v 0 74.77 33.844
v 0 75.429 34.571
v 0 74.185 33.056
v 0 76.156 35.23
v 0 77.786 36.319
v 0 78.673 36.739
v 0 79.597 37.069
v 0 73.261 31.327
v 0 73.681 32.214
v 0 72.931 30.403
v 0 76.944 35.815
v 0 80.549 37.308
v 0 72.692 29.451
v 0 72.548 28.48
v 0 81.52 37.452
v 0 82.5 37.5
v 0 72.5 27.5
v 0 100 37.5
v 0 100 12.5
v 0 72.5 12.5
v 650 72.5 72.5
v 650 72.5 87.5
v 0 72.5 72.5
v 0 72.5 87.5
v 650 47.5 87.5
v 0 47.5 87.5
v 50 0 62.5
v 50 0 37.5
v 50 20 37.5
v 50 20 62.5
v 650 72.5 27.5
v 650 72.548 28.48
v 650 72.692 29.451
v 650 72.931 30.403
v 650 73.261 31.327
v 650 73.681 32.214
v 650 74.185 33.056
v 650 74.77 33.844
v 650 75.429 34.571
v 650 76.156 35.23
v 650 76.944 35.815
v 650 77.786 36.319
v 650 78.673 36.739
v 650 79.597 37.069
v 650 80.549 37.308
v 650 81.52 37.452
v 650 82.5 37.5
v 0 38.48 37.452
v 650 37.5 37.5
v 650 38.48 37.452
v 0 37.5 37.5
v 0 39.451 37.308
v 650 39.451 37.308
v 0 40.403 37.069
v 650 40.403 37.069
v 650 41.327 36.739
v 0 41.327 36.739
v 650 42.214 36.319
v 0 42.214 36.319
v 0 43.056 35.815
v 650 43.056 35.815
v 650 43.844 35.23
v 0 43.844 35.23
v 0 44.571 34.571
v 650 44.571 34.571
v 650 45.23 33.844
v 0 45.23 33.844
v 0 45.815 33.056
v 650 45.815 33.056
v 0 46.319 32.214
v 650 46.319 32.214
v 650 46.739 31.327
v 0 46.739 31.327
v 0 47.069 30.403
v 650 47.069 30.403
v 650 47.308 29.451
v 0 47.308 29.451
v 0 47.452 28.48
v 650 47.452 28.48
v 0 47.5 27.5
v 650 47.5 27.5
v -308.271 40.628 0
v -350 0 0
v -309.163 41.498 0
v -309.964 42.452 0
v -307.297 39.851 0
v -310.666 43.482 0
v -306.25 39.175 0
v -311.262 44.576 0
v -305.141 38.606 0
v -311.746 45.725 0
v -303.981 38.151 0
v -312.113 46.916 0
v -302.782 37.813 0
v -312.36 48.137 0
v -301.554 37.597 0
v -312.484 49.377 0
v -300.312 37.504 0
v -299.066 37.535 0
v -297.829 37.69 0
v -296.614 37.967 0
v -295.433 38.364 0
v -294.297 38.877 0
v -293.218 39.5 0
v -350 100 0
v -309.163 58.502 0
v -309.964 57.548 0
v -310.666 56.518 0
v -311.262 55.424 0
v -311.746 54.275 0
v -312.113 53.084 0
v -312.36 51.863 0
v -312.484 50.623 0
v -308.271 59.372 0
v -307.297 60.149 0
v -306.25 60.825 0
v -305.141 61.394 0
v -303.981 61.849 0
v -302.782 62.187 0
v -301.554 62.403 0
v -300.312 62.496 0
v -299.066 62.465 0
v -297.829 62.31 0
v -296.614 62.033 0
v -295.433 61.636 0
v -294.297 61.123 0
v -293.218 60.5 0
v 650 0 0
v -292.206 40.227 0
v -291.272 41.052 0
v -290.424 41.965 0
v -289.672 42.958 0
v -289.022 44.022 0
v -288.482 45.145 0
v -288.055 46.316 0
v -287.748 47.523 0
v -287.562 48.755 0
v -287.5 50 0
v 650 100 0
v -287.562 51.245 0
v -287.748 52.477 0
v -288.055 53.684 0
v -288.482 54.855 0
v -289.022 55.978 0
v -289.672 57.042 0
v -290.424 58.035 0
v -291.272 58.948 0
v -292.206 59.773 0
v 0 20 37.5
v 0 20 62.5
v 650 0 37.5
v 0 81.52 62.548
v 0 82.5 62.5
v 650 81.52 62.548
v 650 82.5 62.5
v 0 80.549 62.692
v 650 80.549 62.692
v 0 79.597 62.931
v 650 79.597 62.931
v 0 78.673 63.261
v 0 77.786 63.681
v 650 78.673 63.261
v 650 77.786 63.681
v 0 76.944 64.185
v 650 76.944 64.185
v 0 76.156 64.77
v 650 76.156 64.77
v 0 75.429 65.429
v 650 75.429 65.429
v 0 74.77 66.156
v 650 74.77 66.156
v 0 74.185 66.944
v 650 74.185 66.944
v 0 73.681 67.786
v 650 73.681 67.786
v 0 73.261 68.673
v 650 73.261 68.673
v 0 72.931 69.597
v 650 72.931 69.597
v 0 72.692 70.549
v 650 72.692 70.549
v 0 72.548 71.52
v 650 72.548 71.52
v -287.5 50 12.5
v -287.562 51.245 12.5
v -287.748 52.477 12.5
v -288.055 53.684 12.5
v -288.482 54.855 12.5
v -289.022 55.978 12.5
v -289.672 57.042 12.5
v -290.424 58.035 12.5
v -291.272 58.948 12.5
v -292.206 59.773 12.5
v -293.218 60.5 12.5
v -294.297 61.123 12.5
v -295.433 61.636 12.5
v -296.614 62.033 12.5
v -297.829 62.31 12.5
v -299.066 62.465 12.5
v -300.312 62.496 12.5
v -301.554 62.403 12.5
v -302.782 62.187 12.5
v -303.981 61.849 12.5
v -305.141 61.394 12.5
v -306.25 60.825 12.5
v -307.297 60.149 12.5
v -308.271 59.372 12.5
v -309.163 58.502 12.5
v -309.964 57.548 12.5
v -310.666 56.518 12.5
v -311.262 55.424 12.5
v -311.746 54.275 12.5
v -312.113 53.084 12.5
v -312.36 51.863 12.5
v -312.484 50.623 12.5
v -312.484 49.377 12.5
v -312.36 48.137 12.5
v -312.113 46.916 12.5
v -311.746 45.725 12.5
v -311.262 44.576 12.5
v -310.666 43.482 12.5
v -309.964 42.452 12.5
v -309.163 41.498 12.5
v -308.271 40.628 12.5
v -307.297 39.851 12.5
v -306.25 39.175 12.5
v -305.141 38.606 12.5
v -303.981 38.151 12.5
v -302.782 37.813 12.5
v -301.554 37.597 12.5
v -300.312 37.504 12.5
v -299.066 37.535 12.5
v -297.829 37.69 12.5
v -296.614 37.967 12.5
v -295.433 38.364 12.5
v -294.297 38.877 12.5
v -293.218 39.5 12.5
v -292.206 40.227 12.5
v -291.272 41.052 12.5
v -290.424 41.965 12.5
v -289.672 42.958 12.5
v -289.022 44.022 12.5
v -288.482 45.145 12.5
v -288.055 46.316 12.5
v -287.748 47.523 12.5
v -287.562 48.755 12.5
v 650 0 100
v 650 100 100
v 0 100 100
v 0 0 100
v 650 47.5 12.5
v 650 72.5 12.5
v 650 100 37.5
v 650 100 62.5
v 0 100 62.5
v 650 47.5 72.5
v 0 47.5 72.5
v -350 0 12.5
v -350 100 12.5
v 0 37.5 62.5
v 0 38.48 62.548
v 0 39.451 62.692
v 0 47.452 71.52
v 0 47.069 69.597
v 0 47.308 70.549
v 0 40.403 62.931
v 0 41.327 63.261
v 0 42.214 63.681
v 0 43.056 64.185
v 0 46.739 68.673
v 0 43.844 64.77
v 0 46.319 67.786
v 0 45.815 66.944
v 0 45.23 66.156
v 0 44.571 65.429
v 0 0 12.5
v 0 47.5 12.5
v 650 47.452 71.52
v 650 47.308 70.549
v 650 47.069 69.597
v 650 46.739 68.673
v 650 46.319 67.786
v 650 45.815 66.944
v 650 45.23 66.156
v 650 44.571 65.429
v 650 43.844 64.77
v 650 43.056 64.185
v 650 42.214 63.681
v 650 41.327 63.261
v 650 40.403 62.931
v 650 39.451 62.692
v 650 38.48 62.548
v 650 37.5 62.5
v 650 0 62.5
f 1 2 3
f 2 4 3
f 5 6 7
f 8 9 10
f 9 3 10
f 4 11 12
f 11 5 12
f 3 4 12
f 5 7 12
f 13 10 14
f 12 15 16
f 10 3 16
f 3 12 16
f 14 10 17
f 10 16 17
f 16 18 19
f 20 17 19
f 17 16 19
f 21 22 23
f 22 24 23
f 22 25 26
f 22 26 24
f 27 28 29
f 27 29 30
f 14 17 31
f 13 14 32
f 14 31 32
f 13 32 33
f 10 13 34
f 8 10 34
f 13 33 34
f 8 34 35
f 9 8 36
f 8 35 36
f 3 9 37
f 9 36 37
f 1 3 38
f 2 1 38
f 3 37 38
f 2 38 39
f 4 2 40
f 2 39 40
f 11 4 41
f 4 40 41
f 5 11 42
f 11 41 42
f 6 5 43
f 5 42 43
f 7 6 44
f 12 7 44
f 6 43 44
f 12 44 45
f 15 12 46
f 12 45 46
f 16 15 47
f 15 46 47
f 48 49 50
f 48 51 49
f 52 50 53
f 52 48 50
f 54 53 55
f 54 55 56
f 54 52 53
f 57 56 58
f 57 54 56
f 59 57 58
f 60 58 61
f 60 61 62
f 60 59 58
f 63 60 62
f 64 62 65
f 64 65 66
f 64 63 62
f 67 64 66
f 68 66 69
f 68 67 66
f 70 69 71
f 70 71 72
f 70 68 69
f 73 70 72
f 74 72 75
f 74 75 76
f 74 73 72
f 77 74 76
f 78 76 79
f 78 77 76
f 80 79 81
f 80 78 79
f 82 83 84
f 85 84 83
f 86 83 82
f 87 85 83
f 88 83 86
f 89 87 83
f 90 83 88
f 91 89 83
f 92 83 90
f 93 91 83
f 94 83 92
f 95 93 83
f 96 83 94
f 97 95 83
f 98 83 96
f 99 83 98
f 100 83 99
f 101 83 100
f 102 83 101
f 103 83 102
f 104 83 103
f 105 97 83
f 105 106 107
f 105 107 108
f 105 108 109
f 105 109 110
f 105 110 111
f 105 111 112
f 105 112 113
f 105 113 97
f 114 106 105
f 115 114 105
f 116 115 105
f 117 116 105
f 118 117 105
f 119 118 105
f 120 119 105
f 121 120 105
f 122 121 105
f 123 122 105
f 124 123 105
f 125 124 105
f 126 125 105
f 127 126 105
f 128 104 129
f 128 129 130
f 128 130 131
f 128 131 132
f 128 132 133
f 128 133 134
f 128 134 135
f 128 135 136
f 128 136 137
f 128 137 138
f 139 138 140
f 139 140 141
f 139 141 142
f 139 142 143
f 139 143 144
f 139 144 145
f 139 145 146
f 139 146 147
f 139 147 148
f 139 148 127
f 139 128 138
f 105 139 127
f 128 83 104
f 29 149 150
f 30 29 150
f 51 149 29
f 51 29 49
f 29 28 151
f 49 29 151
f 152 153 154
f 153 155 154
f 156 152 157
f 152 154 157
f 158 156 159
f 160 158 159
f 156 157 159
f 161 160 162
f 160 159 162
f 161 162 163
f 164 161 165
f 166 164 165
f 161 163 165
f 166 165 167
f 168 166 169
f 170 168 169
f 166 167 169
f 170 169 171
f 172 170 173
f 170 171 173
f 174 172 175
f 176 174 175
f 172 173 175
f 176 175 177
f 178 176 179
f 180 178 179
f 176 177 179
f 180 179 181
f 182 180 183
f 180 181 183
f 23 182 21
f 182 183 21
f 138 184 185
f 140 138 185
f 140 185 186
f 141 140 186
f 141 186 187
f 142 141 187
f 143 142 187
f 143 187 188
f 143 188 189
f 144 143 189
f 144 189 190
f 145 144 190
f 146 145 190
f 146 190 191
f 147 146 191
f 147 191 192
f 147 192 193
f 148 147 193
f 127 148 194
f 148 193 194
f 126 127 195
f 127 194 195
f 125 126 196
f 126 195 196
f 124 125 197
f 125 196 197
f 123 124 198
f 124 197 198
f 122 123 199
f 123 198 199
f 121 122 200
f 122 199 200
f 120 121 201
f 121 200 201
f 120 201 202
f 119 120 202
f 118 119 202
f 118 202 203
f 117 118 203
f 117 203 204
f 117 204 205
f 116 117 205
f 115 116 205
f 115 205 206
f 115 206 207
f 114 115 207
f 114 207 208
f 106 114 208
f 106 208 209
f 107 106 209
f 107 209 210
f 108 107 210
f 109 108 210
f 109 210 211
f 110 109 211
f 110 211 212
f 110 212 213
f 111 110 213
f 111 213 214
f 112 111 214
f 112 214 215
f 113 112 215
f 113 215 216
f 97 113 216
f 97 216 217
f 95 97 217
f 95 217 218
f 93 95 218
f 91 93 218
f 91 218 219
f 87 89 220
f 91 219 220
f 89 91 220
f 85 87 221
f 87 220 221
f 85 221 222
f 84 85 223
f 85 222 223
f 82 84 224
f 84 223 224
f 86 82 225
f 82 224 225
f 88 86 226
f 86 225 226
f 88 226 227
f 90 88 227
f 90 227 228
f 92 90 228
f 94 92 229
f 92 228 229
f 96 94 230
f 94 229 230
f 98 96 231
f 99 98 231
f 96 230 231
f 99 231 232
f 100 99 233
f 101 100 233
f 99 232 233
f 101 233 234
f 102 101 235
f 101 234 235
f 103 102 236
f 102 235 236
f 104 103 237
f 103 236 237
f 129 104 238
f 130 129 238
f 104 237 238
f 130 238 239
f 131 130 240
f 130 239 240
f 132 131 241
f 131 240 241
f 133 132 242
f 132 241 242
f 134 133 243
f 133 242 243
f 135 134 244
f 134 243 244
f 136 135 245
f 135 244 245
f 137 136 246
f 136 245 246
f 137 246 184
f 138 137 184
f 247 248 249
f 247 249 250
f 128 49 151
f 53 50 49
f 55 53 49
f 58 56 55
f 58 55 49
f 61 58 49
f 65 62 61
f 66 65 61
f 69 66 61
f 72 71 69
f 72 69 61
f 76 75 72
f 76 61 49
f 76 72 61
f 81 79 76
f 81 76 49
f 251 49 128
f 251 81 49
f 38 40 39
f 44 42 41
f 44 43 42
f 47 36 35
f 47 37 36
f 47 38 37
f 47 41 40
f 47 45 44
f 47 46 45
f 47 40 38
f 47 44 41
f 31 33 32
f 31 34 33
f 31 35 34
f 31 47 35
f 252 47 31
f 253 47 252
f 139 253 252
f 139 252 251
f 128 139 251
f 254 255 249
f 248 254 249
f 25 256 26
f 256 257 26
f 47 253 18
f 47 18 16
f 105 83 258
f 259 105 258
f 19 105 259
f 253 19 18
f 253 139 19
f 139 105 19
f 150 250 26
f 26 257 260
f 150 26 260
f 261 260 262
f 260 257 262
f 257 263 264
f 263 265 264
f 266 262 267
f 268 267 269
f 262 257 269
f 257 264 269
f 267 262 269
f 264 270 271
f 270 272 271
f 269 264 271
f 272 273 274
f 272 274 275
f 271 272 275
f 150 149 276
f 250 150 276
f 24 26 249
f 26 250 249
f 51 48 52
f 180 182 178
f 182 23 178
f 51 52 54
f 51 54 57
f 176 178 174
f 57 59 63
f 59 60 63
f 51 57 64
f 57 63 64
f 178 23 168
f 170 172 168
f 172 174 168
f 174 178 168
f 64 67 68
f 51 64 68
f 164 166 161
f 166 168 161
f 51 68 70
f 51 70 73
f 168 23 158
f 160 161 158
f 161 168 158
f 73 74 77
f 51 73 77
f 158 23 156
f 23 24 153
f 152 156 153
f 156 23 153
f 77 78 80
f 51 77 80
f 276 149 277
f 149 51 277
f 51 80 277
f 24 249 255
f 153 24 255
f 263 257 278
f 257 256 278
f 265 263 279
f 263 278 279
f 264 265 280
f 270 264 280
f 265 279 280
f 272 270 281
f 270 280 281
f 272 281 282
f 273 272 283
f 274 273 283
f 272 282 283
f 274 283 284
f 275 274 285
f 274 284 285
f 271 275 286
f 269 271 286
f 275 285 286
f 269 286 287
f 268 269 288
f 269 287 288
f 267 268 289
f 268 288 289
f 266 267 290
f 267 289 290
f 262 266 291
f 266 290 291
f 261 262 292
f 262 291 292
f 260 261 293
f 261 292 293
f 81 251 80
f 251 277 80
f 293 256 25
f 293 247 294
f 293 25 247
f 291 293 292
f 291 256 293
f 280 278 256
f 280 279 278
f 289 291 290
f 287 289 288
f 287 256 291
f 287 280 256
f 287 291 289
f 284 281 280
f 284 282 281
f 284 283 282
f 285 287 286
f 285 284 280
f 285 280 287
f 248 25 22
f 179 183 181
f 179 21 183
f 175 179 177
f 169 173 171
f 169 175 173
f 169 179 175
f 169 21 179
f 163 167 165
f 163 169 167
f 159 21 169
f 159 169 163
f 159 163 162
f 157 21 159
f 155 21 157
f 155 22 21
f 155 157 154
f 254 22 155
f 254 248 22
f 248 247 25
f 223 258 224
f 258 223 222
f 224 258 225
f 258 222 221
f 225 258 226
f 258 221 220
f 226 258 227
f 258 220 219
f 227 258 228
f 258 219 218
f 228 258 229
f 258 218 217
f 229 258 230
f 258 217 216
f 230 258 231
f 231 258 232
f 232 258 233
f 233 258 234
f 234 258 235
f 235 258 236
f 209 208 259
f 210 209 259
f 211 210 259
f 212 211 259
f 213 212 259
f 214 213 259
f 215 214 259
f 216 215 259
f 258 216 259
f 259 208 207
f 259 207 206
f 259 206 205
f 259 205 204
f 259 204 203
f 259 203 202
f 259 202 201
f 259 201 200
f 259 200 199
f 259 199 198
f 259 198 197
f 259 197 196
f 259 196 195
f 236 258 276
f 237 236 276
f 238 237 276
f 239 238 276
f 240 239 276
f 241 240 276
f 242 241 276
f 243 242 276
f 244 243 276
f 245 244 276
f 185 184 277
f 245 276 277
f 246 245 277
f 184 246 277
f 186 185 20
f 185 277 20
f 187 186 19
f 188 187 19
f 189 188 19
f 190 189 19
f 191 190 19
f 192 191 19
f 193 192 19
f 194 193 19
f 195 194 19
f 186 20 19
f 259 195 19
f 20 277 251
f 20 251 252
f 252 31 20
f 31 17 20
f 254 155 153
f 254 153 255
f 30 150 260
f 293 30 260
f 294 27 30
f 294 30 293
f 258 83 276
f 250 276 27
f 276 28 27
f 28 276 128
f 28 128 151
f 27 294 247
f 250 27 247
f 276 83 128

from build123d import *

# Parameters (mm, degrees)
BOSS_EXTRUDE1_DEPTH = 650
SKETCH2_W           = 700
SKETCH2_H           = 25
CUT_EXTRUDE1_DEPTH  = 800
FILLET1_R           = 10
SKETCH3_W           = 12.5
SKETCH3_H           = 100
BOSS_EXTRUDE2_DEPTH = 350
SKETCH4_R           = 12.5
CUT_EXTRUDE2_DEPTH  = 350


with BuildPart() as part:
    # Sketch1 → Boss-Extrude1 (new body)
    with BuildSketch(Plane(origin=(0, 0, 0), x_dir=(0, 0, -1), z_dir=(1, 0, 0))):
        Polygon((-100, 0), (0, 0), (0, 100), (-37.5, 100), (-37.5, 72.5), (-12.5, 72.5), (-12.5, 47.5), (-37.5, 47.5), (-37.5, 20), (-62.5, 20), (-62.5, 47.5), (-87.5, 47.5), (-87.5, 72.5), (-62.5, 72.5), (-62.5, 100), (-100, 100), align=None)
    extrude(amount=BOSS_EXTRUDE1_DEPTH)

    # Sketch2 → Cut-Extrude1 (cut)
    with BuildSketch(Plane.XZ):
        with Locations((400, 50)):
            Rectangle(SKETCH2_W, SKETCH2_H)
    extrude(amount=-CUT_EXTRUDE1_DEPTH, mode=Mode.SUBTRACT)

    # Fillet1
    fillet1_edges = [part.edges().sort_by_distance(p)[0] for p in [
        (325, 72.5, 37.5),
        (325, 72.5, 62.5),
        (325, 47.5, 62.5),
        (325, 47.5, 37.5),
    ]]
    fillet(fillet1_edges, radius=FILLET1_R)

    # Sketch3 → Boss-Extrude2 (add)
    with BuildSketch(Plane.ZY):
        with Locations((6.25, 50)):
            Rectangle(SKETCH3_W, SKETCH3_H)
    extrude(amount=BOSS_EXTRUDE2_DEPTH)

    # Sketch4 → Cut-Extrude2 (cut)
    with BuildSketch(Plane.XY.offset(12.5)):
        with Locations((-300, 50)):
            Circle(SKETCH4_R)
    extrude(amount=-CUT_EXTRUDE2_DEPTH, mode=Mode.SUBTRACT)


solid = part.part
